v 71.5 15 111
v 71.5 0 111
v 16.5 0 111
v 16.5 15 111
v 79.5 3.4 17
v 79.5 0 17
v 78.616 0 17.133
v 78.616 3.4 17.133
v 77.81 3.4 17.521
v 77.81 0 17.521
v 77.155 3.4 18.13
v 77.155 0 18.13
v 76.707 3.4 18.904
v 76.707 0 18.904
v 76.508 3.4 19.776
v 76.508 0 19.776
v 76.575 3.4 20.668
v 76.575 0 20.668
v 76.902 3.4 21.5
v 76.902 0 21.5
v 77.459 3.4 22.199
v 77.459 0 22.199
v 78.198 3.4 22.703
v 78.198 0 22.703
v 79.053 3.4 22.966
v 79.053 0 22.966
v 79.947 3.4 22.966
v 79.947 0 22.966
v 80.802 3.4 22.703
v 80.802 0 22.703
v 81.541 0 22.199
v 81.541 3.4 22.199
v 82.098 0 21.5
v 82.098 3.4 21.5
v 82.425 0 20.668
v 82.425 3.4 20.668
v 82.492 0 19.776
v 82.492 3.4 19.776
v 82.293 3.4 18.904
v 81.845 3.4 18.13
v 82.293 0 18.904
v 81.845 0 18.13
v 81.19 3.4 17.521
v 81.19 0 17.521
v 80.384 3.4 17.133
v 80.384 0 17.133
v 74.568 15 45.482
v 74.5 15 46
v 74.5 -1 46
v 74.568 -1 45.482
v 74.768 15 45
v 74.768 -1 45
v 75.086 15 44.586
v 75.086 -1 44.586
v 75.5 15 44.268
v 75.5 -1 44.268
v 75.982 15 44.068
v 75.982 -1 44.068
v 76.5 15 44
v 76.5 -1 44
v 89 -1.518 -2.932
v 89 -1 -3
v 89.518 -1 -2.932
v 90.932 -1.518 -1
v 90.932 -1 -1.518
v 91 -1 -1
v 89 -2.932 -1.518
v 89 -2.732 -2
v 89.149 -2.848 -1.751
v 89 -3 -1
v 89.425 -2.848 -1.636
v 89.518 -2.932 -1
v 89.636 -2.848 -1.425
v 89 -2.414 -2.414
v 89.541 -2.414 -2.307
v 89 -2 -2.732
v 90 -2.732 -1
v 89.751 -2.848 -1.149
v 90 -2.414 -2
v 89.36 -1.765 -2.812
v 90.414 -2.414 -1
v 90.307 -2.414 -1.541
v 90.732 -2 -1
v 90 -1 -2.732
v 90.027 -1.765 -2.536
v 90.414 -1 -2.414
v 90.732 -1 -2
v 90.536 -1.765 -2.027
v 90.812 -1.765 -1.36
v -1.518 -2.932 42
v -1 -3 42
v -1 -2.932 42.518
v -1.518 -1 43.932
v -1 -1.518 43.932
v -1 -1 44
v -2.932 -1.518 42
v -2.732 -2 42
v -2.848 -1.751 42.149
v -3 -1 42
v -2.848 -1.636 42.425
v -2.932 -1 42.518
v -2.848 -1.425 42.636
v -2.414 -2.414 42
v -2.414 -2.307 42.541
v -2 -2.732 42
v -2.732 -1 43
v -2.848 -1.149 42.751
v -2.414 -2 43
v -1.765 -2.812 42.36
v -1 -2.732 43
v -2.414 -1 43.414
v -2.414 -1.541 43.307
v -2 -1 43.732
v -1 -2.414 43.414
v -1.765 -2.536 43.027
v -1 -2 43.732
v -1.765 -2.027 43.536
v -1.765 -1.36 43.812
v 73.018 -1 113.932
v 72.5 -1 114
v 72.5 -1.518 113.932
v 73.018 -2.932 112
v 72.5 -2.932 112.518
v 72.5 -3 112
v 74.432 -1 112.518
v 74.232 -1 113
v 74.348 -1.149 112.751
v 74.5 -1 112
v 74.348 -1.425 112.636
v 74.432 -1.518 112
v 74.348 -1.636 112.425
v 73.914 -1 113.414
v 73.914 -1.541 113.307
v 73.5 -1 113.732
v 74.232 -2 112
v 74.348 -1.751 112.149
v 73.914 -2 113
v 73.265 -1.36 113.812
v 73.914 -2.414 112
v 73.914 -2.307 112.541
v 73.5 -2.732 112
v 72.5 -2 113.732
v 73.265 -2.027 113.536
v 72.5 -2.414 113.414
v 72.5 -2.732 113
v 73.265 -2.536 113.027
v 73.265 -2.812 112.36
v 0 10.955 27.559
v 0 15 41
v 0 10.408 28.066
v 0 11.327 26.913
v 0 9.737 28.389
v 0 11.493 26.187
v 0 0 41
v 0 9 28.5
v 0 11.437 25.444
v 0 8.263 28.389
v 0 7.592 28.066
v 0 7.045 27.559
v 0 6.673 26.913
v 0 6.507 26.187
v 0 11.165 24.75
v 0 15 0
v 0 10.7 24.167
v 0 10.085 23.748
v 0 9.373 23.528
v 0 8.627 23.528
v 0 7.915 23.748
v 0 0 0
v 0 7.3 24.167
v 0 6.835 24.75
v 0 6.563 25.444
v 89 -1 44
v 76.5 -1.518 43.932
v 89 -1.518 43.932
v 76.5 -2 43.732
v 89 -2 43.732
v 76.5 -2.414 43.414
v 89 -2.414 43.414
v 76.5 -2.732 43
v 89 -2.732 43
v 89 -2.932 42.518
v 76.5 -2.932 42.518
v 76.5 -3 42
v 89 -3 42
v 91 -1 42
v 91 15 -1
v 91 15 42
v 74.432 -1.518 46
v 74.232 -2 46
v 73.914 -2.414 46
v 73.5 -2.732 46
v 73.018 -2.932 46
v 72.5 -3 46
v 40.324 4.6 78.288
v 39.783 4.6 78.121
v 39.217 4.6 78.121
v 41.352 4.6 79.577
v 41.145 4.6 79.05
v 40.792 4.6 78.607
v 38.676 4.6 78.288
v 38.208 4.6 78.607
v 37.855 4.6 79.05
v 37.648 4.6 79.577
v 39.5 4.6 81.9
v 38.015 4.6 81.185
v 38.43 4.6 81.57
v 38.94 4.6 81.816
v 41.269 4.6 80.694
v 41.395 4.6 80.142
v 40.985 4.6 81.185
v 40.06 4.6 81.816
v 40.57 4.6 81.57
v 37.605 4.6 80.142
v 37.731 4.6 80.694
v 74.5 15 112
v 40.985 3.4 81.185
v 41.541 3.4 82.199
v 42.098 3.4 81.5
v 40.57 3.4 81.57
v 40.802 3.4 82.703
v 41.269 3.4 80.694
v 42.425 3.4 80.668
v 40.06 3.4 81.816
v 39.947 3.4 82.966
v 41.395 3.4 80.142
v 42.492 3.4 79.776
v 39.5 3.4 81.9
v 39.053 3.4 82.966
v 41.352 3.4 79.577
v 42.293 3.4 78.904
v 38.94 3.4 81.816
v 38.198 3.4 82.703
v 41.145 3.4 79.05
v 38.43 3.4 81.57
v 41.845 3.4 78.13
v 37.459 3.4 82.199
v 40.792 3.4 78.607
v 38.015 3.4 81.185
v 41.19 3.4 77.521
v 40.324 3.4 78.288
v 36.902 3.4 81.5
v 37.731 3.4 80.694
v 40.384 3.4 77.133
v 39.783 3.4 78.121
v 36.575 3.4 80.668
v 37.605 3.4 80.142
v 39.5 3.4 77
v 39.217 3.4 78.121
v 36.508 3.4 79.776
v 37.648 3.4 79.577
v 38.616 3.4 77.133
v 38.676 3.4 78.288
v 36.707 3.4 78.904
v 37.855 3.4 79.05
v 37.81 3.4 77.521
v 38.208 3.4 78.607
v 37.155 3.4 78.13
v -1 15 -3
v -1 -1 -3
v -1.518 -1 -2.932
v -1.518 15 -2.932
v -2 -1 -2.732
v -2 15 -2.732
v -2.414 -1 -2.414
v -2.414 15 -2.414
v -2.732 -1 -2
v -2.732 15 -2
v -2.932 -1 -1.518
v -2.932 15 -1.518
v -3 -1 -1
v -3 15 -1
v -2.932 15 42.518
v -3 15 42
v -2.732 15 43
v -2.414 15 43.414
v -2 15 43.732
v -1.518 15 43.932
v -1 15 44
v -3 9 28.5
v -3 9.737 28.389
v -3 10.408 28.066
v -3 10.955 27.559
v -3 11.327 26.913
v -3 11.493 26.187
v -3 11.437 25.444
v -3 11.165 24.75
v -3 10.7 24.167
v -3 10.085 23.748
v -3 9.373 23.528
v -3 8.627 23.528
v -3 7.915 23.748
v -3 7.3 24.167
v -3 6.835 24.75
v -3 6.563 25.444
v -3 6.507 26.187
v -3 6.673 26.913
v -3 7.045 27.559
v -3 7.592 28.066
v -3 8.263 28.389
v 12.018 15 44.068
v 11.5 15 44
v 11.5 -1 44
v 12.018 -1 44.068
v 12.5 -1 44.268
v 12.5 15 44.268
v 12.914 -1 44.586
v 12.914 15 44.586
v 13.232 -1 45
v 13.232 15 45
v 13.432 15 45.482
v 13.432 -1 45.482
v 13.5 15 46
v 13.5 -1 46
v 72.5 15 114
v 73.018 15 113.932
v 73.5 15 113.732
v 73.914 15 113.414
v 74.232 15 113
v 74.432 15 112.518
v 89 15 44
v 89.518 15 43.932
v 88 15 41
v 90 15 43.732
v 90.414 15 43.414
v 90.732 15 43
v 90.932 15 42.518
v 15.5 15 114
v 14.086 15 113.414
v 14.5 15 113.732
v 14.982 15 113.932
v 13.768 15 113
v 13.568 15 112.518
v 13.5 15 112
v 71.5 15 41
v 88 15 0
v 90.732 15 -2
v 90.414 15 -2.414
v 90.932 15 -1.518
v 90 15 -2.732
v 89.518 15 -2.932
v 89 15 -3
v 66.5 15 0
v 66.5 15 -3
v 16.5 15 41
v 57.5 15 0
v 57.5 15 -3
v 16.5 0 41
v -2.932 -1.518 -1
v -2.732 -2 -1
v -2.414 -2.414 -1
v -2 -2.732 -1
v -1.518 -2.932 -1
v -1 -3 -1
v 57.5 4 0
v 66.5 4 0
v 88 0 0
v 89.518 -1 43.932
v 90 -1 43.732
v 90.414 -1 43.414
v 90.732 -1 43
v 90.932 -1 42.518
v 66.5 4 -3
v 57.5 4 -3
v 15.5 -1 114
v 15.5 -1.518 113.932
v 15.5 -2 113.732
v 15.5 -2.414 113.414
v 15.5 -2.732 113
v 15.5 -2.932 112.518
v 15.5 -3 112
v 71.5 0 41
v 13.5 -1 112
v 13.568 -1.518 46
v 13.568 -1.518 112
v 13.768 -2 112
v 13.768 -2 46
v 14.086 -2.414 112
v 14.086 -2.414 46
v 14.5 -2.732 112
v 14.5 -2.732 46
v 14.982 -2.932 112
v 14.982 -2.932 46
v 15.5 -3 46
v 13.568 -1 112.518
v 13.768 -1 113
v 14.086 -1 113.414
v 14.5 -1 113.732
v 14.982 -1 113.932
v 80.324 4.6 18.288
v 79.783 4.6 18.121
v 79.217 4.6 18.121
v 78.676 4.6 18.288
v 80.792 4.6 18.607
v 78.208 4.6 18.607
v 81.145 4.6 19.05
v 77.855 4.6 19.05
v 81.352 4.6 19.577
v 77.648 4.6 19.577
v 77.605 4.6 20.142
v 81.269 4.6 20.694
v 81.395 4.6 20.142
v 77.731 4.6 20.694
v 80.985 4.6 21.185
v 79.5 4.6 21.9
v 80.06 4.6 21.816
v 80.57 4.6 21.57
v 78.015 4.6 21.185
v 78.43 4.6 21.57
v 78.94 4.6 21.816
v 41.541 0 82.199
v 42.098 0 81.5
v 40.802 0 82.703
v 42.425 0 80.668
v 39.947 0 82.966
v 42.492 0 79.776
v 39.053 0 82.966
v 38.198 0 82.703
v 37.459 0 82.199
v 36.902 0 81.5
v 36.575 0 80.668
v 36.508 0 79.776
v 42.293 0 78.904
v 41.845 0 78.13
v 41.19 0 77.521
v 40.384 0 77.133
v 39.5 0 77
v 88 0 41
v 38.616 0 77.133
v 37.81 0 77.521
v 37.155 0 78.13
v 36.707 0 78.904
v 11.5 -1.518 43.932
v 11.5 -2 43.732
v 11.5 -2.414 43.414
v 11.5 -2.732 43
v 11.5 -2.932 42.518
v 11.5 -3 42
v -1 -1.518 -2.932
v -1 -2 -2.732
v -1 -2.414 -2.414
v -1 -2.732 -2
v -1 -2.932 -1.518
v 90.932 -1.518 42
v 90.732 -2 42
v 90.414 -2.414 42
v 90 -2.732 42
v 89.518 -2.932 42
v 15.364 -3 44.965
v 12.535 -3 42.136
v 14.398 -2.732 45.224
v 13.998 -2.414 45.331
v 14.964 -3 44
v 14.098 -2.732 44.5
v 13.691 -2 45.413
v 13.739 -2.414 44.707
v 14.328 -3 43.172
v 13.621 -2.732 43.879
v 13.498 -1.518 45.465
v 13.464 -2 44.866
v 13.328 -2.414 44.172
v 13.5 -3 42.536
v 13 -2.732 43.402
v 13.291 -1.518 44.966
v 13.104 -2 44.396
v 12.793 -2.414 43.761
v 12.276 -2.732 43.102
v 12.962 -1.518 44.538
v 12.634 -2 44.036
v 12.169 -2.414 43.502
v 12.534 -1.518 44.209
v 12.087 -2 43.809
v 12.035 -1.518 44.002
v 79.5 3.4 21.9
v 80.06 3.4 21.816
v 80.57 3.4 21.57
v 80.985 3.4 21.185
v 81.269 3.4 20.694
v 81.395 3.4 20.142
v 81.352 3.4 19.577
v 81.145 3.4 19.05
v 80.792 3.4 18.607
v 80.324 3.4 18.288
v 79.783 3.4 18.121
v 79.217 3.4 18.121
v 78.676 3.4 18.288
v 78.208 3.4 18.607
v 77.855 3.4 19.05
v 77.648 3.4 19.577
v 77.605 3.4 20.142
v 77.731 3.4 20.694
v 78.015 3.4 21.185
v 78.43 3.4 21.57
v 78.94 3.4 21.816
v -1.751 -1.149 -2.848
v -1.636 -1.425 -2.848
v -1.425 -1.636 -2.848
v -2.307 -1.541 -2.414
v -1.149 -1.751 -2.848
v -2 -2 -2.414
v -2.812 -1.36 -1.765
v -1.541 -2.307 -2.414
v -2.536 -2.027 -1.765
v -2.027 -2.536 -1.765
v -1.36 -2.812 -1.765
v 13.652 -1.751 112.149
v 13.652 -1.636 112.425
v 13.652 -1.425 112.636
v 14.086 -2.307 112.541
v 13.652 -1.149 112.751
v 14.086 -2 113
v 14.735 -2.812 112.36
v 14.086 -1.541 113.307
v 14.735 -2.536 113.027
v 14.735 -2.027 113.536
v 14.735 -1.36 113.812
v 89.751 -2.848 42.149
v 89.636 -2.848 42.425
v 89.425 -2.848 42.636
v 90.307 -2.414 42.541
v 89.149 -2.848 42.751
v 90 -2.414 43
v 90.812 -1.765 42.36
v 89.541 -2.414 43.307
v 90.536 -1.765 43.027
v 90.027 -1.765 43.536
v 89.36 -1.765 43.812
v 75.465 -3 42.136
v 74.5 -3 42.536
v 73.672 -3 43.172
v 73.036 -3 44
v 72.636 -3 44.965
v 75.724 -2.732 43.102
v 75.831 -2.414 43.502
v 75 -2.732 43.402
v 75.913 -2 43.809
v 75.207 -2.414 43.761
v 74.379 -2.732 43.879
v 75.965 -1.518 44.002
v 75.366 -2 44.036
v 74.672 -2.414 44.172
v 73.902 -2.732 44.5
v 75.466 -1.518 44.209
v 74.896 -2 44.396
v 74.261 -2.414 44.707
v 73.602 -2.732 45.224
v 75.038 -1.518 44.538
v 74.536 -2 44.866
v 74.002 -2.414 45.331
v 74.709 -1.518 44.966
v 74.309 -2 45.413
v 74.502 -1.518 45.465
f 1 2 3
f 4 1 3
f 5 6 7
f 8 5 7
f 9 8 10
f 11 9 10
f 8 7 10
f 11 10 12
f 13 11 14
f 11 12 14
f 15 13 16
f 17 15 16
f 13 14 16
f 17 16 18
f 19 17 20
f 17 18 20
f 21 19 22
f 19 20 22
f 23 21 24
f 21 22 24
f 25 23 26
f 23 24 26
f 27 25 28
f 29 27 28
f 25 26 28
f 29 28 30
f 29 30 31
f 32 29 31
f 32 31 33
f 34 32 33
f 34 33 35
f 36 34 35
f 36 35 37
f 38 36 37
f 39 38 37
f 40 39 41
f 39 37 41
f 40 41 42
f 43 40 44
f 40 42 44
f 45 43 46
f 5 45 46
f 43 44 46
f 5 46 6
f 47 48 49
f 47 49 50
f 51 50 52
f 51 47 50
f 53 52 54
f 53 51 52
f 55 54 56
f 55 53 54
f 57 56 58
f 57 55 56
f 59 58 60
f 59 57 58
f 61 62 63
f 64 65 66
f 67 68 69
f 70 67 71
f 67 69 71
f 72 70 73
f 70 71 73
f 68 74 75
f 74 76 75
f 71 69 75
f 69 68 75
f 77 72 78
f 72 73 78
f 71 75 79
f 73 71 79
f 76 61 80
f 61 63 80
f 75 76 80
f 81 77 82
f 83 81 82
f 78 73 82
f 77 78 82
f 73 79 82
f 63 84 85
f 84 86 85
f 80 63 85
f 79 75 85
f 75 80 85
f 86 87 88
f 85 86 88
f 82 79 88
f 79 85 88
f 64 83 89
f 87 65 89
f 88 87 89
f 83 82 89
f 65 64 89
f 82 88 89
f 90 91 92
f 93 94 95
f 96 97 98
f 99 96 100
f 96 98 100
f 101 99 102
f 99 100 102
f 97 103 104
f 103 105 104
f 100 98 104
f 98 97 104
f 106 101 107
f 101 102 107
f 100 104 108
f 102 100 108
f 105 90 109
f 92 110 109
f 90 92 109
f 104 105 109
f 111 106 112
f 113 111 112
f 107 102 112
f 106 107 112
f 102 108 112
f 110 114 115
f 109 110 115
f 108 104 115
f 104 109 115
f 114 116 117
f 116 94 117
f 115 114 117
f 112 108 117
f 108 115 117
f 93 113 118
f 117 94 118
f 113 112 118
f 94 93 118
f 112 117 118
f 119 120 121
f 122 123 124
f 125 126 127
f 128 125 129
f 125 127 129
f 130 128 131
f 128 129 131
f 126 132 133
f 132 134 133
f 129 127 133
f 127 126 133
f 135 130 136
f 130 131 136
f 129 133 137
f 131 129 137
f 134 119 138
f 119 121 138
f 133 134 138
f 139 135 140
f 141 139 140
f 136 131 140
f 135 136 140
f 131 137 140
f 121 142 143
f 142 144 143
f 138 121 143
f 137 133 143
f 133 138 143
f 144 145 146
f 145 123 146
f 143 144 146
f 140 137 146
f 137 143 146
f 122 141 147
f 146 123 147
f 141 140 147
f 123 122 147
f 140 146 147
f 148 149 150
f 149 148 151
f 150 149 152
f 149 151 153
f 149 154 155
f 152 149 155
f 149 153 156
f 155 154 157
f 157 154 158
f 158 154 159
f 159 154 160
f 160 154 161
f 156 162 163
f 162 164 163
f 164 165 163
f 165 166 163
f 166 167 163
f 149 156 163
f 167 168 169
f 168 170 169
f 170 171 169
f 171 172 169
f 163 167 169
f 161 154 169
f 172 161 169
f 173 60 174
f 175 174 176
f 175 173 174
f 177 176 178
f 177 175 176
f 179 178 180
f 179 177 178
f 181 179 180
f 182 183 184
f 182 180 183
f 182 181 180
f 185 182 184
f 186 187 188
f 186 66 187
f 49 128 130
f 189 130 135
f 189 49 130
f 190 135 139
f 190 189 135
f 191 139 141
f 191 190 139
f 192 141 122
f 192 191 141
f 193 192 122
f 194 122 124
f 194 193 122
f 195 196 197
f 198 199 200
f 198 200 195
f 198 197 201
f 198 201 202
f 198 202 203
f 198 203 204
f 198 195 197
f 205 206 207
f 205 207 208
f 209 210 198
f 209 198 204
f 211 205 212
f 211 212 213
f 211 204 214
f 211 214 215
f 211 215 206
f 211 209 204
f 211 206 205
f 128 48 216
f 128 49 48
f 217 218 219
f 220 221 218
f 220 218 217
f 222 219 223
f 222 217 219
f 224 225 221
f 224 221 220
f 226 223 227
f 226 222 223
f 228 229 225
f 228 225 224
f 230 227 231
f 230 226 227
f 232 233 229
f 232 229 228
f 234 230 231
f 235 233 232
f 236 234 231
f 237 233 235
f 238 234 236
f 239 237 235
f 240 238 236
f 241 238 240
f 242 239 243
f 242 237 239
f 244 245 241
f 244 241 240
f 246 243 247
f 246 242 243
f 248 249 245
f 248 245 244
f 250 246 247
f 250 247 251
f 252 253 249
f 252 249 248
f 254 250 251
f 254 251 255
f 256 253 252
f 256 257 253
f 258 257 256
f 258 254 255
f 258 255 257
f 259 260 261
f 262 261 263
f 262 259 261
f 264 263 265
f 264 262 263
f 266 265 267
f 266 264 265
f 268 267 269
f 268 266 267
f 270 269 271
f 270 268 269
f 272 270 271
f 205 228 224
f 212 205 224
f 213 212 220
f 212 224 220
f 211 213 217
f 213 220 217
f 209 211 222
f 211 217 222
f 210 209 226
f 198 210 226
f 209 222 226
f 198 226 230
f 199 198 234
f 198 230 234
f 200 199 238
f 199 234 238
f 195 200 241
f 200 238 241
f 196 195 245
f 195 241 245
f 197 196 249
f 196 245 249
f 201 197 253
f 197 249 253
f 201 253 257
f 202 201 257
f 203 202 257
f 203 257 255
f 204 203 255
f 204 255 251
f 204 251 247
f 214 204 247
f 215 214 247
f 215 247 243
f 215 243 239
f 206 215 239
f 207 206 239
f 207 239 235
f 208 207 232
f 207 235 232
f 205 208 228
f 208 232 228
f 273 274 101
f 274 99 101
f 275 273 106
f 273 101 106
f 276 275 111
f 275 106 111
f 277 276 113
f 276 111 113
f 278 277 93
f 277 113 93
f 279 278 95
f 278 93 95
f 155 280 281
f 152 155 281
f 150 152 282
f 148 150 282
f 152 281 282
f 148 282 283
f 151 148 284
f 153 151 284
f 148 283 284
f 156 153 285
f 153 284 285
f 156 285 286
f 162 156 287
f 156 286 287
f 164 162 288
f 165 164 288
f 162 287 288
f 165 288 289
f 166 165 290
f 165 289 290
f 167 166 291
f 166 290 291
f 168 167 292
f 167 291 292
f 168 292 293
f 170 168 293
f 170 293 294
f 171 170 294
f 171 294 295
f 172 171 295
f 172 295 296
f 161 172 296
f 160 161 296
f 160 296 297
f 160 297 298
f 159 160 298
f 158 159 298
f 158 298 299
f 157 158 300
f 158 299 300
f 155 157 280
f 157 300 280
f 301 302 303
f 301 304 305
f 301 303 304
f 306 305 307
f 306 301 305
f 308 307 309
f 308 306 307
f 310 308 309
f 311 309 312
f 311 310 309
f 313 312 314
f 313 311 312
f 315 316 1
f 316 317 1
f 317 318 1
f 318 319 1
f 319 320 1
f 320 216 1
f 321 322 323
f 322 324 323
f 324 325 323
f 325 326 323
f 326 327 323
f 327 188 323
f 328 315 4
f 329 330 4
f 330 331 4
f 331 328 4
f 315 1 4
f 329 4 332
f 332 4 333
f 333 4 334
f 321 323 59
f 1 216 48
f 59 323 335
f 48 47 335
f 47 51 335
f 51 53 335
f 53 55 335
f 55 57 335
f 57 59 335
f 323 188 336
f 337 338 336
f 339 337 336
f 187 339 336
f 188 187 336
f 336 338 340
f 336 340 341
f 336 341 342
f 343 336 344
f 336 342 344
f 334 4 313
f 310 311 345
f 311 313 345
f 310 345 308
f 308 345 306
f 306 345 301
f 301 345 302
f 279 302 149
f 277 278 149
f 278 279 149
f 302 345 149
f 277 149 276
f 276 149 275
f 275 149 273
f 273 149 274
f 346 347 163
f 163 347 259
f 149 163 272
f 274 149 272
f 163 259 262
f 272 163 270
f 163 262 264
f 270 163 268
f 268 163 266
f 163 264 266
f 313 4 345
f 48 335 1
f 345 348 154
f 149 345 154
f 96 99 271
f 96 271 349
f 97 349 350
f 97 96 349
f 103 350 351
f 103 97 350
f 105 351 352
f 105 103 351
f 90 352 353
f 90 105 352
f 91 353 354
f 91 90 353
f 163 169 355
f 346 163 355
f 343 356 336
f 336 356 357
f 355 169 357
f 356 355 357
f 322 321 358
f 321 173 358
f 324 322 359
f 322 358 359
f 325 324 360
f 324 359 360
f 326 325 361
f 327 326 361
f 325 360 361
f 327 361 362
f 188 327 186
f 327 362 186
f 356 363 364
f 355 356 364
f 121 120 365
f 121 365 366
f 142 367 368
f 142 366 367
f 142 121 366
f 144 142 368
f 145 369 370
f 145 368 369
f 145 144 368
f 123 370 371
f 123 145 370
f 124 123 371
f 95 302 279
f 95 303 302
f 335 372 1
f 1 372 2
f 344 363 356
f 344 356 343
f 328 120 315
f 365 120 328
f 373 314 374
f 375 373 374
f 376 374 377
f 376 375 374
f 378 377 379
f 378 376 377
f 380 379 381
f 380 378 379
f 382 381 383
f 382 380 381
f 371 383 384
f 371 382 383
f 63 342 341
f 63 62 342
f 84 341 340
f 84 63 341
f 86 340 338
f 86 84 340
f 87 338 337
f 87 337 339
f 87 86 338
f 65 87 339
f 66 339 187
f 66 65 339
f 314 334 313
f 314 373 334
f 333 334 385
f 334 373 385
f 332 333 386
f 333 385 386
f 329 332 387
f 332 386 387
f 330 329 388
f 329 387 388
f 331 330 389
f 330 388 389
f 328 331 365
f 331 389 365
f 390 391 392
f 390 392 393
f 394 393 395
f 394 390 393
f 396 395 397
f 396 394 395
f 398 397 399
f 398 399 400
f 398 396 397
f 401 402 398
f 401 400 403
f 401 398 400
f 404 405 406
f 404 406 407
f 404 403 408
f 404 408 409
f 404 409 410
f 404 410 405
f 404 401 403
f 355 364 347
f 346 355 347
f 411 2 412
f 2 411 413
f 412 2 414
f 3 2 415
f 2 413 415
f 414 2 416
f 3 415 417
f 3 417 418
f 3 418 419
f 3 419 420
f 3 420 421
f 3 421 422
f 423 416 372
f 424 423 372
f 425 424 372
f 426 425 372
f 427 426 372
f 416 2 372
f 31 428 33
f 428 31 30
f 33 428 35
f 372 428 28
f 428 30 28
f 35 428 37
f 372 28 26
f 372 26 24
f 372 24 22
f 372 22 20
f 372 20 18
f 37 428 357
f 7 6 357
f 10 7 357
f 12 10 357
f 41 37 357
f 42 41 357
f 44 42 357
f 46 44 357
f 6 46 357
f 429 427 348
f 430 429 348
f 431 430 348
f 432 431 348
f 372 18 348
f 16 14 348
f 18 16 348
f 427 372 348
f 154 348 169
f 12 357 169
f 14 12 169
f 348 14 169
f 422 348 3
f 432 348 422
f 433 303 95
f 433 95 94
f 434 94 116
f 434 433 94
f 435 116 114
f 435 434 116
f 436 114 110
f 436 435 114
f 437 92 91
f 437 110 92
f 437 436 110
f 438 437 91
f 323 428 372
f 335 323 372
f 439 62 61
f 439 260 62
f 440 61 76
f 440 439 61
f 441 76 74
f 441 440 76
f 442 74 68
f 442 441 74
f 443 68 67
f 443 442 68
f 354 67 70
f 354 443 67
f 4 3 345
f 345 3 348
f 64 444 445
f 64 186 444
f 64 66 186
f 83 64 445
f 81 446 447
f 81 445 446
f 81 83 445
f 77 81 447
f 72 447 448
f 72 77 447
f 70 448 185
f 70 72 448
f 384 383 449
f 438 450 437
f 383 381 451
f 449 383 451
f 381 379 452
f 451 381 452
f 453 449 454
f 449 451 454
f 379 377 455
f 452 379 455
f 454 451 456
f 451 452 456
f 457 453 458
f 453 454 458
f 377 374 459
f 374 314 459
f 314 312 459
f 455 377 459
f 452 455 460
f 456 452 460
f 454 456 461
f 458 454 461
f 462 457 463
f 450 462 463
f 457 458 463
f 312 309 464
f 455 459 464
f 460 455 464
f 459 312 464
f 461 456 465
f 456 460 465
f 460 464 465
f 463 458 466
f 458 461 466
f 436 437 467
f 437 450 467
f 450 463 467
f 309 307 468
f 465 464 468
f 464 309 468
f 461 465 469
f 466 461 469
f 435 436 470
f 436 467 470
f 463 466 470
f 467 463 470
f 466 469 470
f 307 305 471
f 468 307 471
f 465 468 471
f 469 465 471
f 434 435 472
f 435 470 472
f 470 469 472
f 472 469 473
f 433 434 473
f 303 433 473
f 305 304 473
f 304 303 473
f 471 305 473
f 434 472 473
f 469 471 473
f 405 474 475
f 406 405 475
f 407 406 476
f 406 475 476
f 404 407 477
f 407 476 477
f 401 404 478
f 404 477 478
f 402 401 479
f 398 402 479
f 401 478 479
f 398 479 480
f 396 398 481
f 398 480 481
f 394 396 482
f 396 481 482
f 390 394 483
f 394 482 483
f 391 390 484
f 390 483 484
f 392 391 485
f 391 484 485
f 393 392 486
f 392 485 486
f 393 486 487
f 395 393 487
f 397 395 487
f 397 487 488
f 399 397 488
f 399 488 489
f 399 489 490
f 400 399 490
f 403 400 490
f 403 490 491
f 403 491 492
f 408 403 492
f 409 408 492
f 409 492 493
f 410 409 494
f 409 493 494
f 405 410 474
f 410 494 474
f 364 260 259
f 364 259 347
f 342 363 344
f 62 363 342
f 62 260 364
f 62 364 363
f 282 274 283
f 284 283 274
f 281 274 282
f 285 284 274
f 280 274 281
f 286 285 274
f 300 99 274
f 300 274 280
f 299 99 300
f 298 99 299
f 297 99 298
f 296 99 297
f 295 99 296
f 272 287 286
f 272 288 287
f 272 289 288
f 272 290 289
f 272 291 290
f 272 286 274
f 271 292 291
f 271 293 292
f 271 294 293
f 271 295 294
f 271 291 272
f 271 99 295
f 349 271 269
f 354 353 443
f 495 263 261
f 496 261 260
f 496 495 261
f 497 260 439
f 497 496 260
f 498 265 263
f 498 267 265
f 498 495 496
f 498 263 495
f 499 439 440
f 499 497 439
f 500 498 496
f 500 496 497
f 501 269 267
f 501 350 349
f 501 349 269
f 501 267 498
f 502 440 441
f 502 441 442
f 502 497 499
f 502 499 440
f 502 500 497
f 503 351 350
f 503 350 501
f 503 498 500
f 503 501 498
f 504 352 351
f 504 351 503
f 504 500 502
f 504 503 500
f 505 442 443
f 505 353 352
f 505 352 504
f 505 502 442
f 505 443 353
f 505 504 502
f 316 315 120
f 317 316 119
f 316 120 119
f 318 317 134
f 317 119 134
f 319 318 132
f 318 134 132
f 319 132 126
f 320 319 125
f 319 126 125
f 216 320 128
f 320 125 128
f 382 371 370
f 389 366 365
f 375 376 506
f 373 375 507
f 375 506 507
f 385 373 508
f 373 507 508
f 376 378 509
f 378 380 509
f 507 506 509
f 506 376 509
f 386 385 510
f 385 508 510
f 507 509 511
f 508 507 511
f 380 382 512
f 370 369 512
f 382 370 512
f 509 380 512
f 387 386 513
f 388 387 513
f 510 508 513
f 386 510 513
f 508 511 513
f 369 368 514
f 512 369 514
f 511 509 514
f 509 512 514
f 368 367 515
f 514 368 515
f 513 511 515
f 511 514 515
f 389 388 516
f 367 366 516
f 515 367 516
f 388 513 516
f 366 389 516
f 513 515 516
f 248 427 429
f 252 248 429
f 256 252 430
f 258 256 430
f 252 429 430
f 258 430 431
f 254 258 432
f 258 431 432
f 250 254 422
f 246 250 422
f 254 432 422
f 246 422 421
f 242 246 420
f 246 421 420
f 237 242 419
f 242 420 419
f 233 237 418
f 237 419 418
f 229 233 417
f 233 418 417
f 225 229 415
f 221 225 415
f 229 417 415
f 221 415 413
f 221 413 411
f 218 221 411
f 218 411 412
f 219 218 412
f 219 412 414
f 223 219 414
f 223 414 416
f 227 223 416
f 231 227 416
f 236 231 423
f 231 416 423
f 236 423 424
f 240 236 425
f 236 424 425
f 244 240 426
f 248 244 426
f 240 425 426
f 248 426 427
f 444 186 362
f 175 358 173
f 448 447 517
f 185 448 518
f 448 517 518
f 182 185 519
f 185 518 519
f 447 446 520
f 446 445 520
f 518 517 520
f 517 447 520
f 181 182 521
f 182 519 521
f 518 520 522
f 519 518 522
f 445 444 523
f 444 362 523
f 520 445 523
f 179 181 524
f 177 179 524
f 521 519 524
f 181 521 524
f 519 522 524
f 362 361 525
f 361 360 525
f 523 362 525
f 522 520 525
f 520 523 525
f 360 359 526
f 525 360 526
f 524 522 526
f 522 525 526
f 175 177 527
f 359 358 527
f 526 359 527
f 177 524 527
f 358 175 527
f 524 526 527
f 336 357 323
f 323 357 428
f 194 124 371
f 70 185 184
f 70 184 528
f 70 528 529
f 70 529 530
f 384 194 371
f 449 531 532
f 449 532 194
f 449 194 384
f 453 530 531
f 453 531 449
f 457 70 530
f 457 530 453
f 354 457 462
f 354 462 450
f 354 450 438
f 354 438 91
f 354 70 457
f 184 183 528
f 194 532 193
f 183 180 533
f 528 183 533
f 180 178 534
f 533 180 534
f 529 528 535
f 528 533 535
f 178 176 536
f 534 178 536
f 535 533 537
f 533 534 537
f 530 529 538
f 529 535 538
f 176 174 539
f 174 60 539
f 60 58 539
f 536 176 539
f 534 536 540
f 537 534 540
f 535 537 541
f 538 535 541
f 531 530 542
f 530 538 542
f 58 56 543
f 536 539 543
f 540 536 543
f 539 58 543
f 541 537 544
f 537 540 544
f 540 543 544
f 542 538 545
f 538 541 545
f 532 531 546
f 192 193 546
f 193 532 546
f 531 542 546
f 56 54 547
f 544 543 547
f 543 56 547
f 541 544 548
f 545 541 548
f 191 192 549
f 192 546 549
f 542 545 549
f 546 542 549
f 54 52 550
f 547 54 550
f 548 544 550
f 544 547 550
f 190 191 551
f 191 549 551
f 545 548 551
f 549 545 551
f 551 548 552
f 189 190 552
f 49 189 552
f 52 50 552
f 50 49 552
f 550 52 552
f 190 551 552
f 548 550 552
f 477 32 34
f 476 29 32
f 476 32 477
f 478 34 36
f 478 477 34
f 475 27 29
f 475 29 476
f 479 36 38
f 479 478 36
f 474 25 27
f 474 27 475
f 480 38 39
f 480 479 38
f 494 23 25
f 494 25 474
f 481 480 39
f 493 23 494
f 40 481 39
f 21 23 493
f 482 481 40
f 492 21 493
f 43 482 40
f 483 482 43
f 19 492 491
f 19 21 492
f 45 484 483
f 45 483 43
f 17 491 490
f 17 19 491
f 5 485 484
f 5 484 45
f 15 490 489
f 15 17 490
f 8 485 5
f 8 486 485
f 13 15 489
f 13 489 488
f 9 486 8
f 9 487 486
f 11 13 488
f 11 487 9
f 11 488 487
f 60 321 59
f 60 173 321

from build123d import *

# Parameters (mm, degrees)
BOSS_EXTRUDE1_DEPTH = 15
SHELL1_T            = 3
SKETCH3_W           = 9
SKETCH3_H           = 11
CUT_EXTRUDE1_DEPTH  = 3
SKETCH4_R           = 2.5
CUT_EXTRUDE2_DEPTH  = 3
FILLET1_R           = 2
SKETCH5_R           = 3
BOSS_EXTRUDE2_DEPTH = 3.4
SKETCH6_R           = 1.9
BOSS_EXTRUDE3_DEPTH = 1.2


with BuildPart() as part:
    # Sketch1 → Boss-Extrude1 (new body)
    with BuildSketch(Plane(origin=(0, 0, 0), x_dir=(1, 0, 0), z_dir=(0, 1, 0))):
        Polygon((0, 0), (88, 0), (88, -41), (71.5, -41), (71.5, -111), (16.5, -111), (16.5, -41), (0, -41), align=None)
    extrude(amount=BOSS_EXTRUDE1_DEPTH)

    # Shell1
    shell1_openings = [part.faces().sort_by_distance(p)[0] for p in [
        (44, 15, 49.150442478),
    ]]
    offset(amount=SHELL1_T, openings=shell1_openings, kind=Kind.INTERSECTION)

    # Sketch3 → Cut-Extrude1 (cut)
    with BuildSketch(Plane(origin=(0, 0, -3), x_dir=(-1, 0, 0), z_dir=(0, 0, -1))):
        with Locations((-62, 9.5)):
            Rectangle(SKETCH3_W, SKETCH3_H)
    extrude(amount=-CUT_EXTRUDE1_DEPTH, mode=Mode.SUBTRACT)

    # Sketch4 → Cut-Extrude2 (cut)
    with BuildSketch(Plane.ZY.offset(3)):
        with Locations((26, 9)):
            Circle(SKETCH4_R)
    extrude(amount=-CUT_EXTRUDE2_DEPTH, mode=Mode.SUBTRACT)

    # Fillet1
    fillet1_edges = [part.edges().sort_by_distance(p)[0] for p in [
        (44, -3, 114),
        (13.5, -3, 79),
        (5.25, -3, 44),
        (-3, -3, 20.5),
        (-3, 6, -3),
        (91, 6, -3),
        (91, 6, 44),
        (74.5, 6, 44),
        (74.5, 6, 114),
        (13.5, 6, 114),
        (13.5, 6, 44),
        (-3, 6, 44),
        (44, -3, -3),
        (91, -3, 20.5),
        (82.75, -3, 44),
        (74.5, -3, 79),
    ]]
    fillet(fillet1_edges, radius=FILLET1_R)

    # Sketch5 → Boss-Extrude2 (add)
    with BuildSketch(Plane(origin=(0, 0, 0), x_dir=(1, 0, 0), z_dir=(0, 1, 0))):
        with Locations(Location((39.5, -80, 0), (0, 0, 90))):
            Circle(SKETCH5_R)
        with Locations(Location((79.5, -20, 0), (0, 0, 90))):
            Circle(SKETCH5_R)
    extrude(amount=BOSS_EXTRUDE2_DEPTH)

    # Sketch6 → Boss-Extrude3 (add)
    with BuildSketch(Plane(origin=(0, 3.4, 0), x_dir=(1, 0, 0), z_dir=(0, 1, 0))):
        with Locations(Location((39.5, -80, 0), (0, 0, 270))):
            Circle(SKETCH6_R)
        with Locations(Location((79.5, -20, 0), (0, 0, 270))):
            Circle(SKETCH6_R)
    extrude(amount=BOSS_EXTRUDE3_DEPTH)


solid = part.part
